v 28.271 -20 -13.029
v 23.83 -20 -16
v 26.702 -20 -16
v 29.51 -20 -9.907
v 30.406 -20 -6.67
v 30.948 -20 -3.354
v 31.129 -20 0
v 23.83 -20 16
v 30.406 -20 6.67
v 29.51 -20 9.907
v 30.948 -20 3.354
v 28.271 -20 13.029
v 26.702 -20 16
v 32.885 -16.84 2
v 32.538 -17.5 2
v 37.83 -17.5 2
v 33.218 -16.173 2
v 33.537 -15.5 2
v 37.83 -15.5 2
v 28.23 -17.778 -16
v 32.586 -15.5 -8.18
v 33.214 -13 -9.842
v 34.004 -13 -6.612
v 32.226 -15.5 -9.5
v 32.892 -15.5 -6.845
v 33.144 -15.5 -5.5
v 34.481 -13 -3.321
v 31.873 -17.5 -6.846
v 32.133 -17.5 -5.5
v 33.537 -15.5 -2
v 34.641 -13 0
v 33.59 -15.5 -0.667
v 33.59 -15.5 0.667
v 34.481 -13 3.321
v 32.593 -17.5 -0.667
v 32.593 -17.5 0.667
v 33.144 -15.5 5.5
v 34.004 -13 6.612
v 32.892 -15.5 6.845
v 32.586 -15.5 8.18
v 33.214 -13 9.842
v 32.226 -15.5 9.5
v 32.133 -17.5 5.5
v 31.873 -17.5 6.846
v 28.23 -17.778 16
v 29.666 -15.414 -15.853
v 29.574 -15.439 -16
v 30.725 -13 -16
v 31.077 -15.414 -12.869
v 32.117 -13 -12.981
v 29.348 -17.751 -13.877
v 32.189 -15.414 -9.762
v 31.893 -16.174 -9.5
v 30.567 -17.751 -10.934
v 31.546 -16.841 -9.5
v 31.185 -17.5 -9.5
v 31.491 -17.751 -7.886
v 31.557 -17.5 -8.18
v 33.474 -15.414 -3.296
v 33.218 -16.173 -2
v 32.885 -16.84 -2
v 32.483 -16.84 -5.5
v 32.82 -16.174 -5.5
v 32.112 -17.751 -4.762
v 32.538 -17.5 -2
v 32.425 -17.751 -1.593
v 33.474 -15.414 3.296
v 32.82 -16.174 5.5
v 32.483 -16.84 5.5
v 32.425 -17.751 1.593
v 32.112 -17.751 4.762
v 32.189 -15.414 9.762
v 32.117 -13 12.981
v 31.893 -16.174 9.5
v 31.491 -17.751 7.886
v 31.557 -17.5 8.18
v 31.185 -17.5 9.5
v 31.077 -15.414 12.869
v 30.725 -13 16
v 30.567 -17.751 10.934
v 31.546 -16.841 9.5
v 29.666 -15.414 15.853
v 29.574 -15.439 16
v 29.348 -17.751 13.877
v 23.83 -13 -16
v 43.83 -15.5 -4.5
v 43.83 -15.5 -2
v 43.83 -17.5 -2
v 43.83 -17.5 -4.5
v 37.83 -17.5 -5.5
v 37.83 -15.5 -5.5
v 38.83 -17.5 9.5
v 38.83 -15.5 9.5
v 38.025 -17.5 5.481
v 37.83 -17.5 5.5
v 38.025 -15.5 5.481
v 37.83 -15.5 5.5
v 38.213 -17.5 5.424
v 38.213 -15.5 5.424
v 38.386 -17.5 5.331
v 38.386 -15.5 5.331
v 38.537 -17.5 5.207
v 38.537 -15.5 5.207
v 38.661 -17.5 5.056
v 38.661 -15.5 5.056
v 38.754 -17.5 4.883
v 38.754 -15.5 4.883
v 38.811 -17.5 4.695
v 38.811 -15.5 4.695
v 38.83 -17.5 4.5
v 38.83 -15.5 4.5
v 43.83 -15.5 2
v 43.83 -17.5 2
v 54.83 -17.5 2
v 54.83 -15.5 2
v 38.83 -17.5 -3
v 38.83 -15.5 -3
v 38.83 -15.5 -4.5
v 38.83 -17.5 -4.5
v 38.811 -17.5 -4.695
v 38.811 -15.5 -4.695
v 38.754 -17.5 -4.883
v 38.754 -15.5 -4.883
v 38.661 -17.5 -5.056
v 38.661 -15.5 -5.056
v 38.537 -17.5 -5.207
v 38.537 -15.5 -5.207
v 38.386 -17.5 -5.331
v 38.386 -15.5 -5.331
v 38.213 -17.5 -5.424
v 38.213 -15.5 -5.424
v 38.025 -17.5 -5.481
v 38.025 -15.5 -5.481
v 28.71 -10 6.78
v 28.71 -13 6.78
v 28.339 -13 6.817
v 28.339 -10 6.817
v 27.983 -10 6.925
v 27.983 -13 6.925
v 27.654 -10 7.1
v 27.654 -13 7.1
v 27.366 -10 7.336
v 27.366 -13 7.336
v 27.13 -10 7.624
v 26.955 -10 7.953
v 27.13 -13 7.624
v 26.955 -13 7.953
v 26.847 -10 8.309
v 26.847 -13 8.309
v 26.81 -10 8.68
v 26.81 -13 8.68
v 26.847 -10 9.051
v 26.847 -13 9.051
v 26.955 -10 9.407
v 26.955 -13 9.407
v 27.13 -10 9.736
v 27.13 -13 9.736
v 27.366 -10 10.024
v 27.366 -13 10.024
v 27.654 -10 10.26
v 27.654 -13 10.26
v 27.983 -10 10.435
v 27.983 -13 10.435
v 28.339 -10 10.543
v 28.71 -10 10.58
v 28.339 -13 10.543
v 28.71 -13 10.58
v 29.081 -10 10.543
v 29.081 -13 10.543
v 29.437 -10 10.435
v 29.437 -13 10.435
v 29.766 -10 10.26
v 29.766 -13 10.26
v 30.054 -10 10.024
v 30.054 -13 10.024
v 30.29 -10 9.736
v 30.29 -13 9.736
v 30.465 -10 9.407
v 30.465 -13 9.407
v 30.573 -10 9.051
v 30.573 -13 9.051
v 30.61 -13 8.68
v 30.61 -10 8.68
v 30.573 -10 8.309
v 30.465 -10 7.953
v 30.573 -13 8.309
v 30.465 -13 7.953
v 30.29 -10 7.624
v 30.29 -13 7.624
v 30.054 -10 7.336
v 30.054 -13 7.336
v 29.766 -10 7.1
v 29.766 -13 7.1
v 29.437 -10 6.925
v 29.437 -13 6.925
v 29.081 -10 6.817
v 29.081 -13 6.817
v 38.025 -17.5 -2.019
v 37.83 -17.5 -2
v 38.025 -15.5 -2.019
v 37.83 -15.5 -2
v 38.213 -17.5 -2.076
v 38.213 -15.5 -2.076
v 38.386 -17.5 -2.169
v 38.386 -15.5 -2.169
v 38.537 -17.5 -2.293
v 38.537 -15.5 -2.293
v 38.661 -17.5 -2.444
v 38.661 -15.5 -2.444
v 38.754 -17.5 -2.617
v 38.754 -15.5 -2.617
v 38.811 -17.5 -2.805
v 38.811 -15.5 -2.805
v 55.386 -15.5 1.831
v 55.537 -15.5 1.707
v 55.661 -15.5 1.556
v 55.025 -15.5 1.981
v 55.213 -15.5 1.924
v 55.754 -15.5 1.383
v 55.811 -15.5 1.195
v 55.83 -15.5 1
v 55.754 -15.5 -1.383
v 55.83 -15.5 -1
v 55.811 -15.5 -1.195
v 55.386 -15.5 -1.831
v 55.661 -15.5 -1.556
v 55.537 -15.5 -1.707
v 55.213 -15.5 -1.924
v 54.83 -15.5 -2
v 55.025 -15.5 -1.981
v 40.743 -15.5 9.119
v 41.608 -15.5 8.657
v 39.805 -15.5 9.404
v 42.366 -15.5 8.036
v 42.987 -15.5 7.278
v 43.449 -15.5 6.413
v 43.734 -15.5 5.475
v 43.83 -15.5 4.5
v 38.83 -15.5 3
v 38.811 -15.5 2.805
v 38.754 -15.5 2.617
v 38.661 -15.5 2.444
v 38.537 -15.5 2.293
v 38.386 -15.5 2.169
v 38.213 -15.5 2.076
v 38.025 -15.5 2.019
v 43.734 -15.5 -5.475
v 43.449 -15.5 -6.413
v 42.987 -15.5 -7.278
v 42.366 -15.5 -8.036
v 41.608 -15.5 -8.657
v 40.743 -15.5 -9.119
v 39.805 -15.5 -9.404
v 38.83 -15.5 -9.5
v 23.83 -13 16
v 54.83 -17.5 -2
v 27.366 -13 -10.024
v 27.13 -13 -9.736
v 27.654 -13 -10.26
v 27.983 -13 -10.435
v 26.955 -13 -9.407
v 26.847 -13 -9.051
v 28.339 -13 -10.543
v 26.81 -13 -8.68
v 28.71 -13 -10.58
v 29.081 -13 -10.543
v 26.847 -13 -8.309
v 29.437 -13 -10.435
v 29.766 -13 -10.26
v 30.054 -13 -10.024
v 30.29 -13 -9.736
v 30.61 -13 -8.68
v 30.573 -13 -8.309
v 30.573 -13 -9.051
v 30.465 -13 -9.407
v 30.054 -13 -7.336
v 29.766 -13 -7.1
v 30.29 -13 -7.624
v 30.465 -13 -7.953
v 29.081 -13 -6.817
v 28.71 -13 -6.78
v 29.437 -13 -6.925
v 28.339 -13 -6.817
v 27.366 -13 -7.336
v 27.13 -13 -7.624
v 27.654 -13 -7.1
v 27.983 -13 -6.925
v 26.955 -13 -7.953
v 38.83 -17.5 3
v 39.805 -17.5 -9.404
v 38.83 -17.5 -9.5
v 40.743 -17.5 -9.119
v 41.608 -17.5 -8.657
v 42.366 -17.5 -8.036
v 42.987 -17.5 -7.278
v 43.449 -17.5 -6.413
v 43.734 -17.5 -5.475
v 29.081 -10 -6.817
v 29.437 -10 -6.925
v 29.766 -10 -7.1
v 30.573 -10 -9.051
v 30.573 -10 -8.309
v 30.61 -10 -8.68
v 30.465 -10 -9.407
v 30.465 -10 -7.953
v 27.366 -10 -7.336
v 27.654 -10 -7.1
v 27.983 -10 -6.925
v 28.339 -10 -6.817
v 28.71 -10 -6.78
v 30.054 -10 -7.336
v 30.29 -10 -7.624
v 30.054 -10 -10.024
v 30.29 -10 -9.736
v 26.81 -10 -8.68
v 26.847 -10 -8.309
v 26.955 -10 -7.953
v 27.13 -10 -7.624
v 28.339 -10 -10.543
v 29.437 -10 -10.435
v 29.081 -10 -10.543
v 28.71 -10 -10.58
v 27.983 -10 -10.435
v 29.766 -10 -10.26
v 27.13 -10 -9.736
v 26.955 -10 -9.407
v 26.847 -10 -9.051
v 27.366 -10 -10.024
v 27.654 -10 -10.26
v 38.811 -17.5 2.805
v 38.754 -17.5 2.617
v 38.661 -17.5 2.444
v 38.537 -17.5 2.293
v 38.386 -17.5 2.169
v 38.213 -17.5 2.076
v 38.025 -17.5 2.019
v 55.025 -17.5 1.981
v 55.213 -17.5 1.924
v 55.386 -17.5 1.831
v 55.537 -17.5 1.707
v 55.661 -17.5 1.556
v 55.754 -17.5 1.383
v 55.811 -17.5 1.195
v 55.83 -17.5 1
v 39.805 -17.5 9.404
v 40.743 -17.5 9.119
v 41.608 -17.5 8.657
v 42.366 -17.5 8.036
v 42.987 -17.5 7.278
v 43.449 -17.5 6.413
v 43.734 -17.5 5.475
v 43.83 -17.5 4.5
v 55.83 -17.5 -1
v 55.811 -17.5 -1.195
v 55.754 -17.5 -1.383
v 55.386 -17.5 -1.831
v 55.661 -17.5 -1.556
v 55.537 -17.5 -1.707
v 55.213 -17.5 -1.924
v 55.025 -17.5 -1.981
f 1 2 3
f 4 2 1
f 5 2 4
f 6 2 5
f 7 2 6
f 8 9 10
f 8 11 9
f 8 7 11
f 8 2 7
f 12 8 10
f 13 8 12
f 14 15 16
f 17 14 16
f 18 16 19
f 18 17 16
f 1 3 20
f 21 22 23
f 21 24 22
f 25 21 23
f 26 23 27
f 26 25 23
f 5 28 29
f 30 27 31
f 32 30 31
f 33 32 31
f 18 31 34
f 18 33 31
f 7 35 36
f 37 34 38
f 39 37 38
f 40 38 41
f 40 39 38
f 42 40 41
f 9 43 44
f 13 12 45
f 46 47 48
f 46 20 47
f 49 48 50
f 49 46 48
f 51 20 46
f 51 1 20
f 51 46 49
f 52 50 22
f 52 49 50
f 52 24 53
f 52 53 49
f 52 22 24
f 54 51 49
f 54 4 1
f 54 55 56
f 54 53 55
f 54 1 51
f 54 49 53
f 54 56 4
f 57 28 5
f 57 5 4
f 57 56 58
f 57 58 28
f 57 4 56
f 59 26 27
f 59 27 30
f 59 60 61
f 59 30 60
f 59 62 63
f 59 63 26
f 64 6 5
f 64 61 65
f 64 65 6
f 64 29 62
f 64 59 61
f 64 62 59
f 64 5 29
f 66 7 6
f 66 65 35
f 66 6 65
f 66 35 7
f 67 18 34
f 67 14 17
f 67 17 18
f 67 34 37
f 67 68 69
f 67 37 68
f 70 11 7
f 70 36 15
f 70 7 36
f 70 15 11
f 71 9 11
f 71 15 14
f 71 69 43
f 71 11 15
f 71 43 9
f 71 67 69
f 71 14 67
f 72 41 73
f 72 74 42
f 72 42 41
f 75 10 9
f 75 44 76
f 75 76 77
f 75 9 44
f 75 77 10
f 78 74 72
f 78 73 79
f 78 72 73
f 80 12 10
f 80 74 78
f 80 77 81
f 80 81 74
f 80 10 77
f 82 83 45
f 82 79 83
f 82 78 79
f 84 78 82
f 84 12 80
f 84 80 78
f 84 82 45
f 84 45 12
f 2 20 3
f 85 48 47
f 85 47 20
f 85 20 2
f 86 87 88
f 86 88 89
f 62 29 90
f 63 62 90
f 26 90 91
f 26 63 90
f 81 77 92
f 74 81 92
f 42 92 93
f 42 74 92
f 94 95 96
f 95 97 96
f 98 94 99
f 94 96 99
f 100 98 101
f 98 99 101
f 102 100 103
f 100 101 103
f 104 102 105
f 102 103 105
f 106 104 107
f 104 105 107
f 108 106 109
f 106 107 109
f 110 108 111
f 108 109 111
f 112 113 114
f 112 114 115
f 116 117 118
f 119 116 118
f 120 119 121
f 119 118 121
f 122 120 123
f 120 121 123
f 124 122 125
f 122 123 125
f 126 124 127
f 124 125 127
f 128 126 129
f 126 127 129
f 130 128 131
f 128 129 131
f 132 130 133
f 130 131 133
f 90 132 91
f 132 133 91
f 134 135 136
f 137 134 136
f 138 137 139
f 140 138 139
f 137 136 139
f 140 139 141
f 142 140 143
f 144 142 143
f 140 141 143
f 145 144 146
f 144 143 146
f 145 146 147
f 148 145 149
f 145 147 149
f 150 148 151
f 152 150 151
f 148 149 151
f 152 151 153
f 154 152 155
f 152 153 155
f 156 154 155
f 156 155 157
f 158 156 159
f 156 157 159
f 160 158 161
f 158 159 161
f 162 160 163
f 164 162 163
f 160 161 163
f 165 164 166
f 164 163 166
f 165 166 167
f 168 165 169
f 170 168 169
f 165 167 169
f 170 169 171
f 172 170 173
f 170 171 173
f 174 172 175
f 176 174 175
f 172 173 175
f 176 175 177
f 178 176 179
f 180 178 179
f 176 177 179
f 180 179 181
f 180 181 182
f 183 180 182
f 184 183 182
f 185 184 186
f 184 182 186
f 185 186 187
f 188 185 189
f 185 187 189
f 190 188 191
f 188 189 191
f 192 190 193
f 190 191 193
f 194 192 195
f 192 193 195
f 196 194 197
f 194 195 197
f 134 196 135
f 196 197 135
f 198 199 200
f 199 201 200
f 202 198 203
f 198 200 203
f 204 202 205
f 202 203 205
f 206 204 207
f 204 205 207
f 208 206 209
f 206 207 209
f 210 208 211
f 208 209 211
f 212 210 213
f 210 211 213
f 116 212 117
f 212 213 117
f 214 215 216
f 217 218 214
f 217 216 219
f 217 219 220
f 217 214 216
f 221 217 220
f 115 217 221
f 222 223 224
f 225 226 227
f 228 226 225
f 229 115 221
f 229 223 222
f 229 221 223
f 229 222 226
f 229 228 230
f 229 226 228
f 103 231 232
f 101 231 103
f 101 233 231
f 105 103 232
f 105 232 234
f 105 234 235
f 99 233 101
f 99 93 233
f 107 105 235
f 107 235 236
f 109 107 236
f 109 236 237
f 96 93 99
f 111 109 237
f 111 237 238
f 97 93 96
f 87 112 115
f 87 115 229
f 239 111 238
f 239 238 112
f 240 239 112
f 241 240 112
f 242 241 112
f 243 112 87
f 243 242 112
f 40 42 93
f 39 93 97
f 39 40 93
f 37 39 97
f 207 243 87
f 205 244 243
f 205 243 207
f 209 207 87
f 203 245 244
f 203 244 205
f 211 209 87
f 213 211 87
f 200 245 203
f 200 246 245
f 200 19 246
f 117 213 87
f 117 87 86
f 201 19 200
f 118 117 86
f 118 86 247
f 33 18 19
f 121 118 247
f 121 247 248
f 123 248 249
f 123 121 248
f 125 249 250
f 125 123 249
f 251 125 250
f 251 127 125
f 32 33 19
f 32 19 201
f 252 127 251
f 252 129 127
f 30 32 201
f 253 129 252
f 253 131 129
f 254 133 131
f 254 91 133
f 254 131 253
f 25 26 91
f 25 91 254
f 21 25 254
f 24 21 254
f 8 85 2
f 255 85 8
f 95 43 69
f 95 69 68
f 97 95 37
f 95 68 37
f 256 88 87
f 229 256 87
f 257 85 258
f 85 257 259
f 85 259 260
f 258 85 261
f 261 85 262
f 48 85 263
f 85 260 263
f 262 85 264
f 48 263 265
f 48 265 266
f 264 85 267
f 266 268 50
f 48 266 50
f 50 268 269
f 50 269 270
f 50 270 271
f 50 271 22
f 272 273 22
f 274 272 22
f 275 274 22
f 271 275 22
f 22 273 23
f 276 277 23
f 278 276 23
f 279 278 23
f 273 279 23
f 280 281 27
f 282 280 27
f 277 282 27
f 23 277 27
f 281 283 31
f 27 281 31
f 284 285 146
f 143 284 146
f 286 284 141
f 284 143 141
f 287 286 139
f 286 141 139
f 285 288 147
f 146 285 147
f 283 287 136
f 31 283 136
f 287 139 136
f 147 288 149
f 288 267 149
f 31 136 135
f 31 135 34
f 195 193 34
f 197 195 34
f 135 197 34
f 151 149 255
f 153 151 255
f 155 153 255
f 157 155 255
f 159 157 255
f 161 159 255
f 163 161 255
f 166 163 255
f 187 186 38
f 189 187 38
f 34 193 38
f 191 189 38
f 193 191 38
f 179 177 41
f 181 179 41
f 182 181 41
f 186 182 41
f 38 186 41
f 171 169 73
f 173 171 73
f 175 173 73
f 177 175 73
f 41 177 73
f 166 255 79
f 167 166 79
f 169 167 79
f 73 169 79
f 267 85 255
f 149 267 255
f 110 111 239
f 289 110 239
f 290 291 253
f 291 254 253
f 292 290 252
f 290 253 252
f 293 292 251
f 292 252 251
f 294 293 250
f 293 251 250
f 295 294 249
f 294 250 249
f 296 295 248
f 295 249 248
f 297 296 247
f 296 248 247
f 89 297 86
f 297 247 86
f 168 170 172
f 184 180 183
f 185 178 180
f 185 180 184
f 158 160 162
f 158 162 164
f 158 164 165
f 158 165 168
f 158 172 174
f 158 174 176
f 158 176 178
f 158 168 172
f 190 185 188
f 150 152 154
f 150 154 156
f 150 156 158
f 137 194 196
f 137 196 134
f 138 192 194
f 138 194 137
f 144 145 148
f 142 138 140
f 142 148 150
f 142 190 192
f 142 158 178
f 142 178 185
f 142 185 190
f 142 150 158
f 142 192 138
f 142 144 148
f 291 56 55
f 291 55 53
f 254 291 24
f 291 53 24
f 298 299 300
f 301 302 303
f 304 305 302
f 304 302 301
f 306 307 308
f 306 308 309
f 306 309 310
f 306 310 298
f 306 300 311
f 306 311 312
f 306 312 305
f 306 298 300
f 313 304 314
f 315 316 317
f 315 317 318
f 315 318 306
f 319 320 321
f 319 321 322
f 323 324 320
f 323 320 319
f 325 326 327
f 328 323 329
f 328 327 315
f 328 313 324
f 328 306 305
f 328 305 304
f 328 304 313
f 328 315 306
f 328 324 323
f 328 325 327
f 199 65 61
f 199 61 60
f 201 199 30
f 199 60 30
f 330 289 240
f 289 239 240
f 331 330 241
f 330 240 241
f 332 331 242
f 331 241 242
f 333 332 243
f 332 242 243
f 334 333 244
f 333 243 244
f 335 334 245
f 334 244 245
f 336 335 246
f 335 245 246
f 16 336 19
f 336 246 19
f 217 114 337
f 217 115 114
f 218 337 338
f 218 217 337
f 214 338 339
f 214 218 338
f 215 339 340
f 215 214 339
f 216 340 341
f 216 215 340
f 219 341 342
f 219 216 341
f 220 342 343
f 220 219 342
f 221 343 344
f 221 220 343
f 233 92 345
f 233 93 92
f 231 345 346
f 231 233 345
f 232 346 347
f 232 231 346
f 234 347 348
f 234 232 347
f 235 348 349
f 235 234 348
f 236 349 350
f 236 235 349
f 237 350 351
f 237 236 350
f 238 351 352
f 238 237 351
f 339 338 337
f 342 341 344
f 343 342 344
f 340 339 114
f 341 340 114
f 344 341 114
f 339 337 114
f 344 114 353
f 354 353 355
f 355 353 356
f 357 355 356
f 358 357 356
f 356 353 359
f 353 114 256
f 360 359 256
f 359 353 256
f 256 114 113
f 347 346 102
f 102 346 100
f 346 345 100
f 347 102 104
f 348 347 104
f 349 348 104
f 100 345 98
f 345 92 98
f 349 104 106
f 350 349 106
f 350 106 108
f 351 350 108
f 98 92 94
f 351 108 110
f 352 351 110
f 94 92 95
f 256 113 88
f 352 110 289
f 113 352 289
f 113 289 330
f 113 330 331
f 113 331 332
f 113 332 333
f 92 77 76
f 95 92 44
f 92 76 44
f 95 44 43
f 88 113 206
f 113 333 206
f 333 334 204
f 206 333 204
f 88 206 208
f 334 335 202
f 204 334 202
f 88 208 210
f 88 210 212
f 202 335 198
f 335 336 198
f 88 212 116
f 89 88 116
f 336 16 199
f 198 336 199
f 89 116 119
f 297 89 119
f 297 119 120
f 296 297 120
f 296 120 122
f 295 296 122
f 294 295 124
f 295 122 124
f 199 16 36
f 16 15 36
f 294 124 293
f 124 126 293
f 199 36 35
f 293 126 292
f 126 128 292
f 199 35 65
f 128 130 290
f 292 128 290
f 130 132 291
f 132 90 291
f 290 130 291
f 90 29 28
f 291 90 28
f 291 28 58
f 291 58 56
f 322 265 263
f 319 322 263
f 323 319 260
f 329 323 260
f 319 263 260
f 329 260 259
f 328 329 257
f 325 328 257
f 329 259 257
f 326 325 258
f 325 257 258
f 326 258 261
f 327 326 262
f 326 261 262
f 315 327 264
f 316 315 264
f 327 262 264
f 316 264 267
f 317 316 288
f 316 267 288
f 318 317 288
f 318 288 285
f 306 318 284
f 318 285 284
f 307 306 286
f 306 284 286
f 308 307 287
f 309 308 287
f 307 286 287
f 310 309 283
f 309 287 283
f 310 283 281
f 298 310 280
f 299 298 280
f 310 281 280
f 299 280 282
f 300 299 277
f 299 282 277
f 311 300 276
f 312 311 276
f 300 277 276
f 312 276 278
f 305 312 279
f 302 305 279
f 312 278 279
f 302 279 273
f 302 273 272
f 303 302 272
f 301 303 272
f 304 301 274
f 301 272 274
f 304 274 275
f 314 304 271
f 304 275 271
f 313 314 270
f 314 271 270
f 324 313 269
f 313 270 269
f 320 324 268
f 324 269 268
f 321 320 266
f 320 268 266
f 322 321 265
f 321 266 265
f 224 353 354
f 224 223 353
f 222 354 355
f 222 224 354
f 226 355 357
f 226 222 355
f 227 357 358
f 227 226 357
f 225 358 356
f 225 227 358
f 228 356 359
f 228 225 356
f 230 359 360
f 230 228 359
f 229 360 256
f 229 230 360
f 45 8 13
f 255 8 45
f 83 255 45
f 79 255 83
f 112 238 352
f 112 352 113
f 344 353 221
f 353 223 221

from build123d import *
from build123d.topology import SkipClean

# Parameters (mm, degrees)
CUT_EXTRUDE_3_DEPTH       = 80
CUT_EXTRUDE_START         = -57
CUT_EXTRUDE_4_DEPTH       = 57
CUT_EXTRUDE_4_2_OUTLINE_W = 14.17
CUT_EXTRUDE_4_2_OUTLINE_H = 32
CUT_EXTRUDE_4_2_DEPTH     = 50
SKETCH_7_R                = 1.9
EXTRUDE_2_DEPTH           = 3
SKETCH_8_W                = 4
SKETCH_8_H                = 2
EXTRUDE_3_DEPTH           = 15
SKETCH_9_W                = 19
SKETCH_9_H                = 2
EXTRUDE_4_DEPTH           = 5
SKETCH_8_2_W              = 4
SKETCH_8_2_H              = 2
EXTRUDE_5_DEPTH           = 32
FILLET_1_R                = 5
FILLET_2_R                = 1
FILLET_3_R                = 1


# Read off the part's stored shape, not the designer's step: 컷-돌출4
with BuildPart() as part:
    # 스케치4 → 회전1 (revolve)
    with SkipClean():  # the faces are left unmerged after this step: merging them gives an invalid solid
        with BuildSketch(Plane.XY):
            with BuildLine():
                ThreePointArc((37, 0), (26.162950904, 26.162950904), (0, 37))
                Line((0, 37), (0, -37))
                ThreePointArc((0, -37), (26.162950904, -26.162950904), (37, 0))
            make_face()
            with BuildLine():
                Line((0, -37), (0, 37))
                ThreePointArc((0, 37), (-37, 0), (0, -37))
            make_face()
        revolve(axis=Axis((0, 48.172126022, 0), (0, -1, 0)))

    # 스케치5 → 컷-돌출3 (cut, symmetric)
    with SkipClean():  # the faces are left unmerged after this step: merging them gives an invalid solid
        with BuildSketch(Plane.XY):
            Polygon((-37.71852549, -20), (40.89907451, -20), (49.098598746, -47.851019931), (-38.951742745, -43.163184314), align=None)
        extrude(amount=CUT_EXTRUDE_3_DEPTH, both=True, mode=Mode.SUBTRACT)

    # 컷-돌출4 outline → 컷-돌출4 (cut)
    with BuildSketch(Plane.XZ.offset(20).offset(CUT_EXTRUDE_START)):
        Polygon((23.83, -16), (23.83, 16), (38, 16), (38, 38), (-38, 38), (-38, -38), (38, -38), (38, -16), align=None)
    extrude(amount=CUT_EXTRUDE_4_DEPTH, mode=Mode.SUBTRACT)

    # Cut-Extrude 4 2 outline → Cut-Extrude 4 2 (cut)
    with BuildSketch(Plane.XZ.offset(20).offset(CUT_EXTRUDE_START)):
        with Locations((30.915, 0)):
            Rectangle(CUT_EXTRUDE_4_2_OUTLINE_W, CUT_EXTRUDE_4_2_OUTLINE_H)
    extrude(amount=CUT_EXTRUDE_4_2_DEPTH, mode=Mode.SUBTRACT)

    # 스케치7 → 보스-돌출2 (add)
    with BuildSketch(Plane(origin=(0, -13, 0), x_dir=(1, 0, 0), z_dir=(0, 1, 0))):
        with Locations(Location((28.71, 8.68, 0), (0, 0, 90))):
            Circle(SKETCH_7_R)
        with Locations(Location((28.71, -8.68, 0), (0, 0, 90))):
            Circle(SKETCH_7_R)
    extrude(amount=EXTRUDE_2_DEPTH)

    # 스케치8 → 보스-돌출3 (add)
    with BuildSketch(Plane.ZY.offset(-23.83)):
        with Locations((-7.5, -16.5)):
            Rectangle(SKETCH_8_W, SKETCH_8_H)
        with Locations((0, -16.5)):
            Rectangle(SKETCH_8_W, SKETCH_8_H)
        with Locations((7.5, -16.5)):
            Rectangle(SKETCH_8_W, SKETCH_8_H)
    extrude(amount=-EXTRUDE_3_DEPTH)

    # 스케치9 → 보스-돌출4 (add)
    with BuildSketch(Plane(origin=(38.83, 0, 0), x_dir=(0, 0, -1), z_dir=(1, 0, 0))):
        with Locations((0, -16.5)):
            Rectangle(SKETCH_9_W, SKETCH_9_H)
    extrude(amount=EXTRUDE_4_DEPTH)

    # 스케치8<2> → 보스-돌출5 (add)
    with BuildSketch(Plane.ZY.offset(-23.83)):
        with Locations((0, -16.5)):
            Rectangle(SKETCH_8_2_W, SKETCH_8_2_H)
    extrude(amount=-EXTRUDE_5_DEPTH)

    # 필렛1
    fillet_1_edges = [part.edges().sort_by_distance(p)[0] for p in [
        (43.83, -16.5, 9.5),
        (43.83, -16.5, -9.5),
    ]]
    fillet(fillet_1_edges, radius=FILLET_1_R)

    # 필렛2
    fillet_2_edges = [part.edges().sort_by_distance(p)[0] for p in [
        (38.83, -16.5, 2),
        (38.83, -16.5, -2),
        (38.83, -16.5, 5.5),
        (38.83, -16.5, -5.5),
    ]]
    fillet(fillet_2_edges, radius=FILLET_2_R)

    # 필렛3
    fillet_3_edges = [part.edges().sort_by_distance(p)[0] for p in [
        (55.83, -16.5, 2),
        (55.83, -16.5, -2),
    ]]
    fillet(fillet_3_edges, radius=FILLET_3_R)


solid = part.part
